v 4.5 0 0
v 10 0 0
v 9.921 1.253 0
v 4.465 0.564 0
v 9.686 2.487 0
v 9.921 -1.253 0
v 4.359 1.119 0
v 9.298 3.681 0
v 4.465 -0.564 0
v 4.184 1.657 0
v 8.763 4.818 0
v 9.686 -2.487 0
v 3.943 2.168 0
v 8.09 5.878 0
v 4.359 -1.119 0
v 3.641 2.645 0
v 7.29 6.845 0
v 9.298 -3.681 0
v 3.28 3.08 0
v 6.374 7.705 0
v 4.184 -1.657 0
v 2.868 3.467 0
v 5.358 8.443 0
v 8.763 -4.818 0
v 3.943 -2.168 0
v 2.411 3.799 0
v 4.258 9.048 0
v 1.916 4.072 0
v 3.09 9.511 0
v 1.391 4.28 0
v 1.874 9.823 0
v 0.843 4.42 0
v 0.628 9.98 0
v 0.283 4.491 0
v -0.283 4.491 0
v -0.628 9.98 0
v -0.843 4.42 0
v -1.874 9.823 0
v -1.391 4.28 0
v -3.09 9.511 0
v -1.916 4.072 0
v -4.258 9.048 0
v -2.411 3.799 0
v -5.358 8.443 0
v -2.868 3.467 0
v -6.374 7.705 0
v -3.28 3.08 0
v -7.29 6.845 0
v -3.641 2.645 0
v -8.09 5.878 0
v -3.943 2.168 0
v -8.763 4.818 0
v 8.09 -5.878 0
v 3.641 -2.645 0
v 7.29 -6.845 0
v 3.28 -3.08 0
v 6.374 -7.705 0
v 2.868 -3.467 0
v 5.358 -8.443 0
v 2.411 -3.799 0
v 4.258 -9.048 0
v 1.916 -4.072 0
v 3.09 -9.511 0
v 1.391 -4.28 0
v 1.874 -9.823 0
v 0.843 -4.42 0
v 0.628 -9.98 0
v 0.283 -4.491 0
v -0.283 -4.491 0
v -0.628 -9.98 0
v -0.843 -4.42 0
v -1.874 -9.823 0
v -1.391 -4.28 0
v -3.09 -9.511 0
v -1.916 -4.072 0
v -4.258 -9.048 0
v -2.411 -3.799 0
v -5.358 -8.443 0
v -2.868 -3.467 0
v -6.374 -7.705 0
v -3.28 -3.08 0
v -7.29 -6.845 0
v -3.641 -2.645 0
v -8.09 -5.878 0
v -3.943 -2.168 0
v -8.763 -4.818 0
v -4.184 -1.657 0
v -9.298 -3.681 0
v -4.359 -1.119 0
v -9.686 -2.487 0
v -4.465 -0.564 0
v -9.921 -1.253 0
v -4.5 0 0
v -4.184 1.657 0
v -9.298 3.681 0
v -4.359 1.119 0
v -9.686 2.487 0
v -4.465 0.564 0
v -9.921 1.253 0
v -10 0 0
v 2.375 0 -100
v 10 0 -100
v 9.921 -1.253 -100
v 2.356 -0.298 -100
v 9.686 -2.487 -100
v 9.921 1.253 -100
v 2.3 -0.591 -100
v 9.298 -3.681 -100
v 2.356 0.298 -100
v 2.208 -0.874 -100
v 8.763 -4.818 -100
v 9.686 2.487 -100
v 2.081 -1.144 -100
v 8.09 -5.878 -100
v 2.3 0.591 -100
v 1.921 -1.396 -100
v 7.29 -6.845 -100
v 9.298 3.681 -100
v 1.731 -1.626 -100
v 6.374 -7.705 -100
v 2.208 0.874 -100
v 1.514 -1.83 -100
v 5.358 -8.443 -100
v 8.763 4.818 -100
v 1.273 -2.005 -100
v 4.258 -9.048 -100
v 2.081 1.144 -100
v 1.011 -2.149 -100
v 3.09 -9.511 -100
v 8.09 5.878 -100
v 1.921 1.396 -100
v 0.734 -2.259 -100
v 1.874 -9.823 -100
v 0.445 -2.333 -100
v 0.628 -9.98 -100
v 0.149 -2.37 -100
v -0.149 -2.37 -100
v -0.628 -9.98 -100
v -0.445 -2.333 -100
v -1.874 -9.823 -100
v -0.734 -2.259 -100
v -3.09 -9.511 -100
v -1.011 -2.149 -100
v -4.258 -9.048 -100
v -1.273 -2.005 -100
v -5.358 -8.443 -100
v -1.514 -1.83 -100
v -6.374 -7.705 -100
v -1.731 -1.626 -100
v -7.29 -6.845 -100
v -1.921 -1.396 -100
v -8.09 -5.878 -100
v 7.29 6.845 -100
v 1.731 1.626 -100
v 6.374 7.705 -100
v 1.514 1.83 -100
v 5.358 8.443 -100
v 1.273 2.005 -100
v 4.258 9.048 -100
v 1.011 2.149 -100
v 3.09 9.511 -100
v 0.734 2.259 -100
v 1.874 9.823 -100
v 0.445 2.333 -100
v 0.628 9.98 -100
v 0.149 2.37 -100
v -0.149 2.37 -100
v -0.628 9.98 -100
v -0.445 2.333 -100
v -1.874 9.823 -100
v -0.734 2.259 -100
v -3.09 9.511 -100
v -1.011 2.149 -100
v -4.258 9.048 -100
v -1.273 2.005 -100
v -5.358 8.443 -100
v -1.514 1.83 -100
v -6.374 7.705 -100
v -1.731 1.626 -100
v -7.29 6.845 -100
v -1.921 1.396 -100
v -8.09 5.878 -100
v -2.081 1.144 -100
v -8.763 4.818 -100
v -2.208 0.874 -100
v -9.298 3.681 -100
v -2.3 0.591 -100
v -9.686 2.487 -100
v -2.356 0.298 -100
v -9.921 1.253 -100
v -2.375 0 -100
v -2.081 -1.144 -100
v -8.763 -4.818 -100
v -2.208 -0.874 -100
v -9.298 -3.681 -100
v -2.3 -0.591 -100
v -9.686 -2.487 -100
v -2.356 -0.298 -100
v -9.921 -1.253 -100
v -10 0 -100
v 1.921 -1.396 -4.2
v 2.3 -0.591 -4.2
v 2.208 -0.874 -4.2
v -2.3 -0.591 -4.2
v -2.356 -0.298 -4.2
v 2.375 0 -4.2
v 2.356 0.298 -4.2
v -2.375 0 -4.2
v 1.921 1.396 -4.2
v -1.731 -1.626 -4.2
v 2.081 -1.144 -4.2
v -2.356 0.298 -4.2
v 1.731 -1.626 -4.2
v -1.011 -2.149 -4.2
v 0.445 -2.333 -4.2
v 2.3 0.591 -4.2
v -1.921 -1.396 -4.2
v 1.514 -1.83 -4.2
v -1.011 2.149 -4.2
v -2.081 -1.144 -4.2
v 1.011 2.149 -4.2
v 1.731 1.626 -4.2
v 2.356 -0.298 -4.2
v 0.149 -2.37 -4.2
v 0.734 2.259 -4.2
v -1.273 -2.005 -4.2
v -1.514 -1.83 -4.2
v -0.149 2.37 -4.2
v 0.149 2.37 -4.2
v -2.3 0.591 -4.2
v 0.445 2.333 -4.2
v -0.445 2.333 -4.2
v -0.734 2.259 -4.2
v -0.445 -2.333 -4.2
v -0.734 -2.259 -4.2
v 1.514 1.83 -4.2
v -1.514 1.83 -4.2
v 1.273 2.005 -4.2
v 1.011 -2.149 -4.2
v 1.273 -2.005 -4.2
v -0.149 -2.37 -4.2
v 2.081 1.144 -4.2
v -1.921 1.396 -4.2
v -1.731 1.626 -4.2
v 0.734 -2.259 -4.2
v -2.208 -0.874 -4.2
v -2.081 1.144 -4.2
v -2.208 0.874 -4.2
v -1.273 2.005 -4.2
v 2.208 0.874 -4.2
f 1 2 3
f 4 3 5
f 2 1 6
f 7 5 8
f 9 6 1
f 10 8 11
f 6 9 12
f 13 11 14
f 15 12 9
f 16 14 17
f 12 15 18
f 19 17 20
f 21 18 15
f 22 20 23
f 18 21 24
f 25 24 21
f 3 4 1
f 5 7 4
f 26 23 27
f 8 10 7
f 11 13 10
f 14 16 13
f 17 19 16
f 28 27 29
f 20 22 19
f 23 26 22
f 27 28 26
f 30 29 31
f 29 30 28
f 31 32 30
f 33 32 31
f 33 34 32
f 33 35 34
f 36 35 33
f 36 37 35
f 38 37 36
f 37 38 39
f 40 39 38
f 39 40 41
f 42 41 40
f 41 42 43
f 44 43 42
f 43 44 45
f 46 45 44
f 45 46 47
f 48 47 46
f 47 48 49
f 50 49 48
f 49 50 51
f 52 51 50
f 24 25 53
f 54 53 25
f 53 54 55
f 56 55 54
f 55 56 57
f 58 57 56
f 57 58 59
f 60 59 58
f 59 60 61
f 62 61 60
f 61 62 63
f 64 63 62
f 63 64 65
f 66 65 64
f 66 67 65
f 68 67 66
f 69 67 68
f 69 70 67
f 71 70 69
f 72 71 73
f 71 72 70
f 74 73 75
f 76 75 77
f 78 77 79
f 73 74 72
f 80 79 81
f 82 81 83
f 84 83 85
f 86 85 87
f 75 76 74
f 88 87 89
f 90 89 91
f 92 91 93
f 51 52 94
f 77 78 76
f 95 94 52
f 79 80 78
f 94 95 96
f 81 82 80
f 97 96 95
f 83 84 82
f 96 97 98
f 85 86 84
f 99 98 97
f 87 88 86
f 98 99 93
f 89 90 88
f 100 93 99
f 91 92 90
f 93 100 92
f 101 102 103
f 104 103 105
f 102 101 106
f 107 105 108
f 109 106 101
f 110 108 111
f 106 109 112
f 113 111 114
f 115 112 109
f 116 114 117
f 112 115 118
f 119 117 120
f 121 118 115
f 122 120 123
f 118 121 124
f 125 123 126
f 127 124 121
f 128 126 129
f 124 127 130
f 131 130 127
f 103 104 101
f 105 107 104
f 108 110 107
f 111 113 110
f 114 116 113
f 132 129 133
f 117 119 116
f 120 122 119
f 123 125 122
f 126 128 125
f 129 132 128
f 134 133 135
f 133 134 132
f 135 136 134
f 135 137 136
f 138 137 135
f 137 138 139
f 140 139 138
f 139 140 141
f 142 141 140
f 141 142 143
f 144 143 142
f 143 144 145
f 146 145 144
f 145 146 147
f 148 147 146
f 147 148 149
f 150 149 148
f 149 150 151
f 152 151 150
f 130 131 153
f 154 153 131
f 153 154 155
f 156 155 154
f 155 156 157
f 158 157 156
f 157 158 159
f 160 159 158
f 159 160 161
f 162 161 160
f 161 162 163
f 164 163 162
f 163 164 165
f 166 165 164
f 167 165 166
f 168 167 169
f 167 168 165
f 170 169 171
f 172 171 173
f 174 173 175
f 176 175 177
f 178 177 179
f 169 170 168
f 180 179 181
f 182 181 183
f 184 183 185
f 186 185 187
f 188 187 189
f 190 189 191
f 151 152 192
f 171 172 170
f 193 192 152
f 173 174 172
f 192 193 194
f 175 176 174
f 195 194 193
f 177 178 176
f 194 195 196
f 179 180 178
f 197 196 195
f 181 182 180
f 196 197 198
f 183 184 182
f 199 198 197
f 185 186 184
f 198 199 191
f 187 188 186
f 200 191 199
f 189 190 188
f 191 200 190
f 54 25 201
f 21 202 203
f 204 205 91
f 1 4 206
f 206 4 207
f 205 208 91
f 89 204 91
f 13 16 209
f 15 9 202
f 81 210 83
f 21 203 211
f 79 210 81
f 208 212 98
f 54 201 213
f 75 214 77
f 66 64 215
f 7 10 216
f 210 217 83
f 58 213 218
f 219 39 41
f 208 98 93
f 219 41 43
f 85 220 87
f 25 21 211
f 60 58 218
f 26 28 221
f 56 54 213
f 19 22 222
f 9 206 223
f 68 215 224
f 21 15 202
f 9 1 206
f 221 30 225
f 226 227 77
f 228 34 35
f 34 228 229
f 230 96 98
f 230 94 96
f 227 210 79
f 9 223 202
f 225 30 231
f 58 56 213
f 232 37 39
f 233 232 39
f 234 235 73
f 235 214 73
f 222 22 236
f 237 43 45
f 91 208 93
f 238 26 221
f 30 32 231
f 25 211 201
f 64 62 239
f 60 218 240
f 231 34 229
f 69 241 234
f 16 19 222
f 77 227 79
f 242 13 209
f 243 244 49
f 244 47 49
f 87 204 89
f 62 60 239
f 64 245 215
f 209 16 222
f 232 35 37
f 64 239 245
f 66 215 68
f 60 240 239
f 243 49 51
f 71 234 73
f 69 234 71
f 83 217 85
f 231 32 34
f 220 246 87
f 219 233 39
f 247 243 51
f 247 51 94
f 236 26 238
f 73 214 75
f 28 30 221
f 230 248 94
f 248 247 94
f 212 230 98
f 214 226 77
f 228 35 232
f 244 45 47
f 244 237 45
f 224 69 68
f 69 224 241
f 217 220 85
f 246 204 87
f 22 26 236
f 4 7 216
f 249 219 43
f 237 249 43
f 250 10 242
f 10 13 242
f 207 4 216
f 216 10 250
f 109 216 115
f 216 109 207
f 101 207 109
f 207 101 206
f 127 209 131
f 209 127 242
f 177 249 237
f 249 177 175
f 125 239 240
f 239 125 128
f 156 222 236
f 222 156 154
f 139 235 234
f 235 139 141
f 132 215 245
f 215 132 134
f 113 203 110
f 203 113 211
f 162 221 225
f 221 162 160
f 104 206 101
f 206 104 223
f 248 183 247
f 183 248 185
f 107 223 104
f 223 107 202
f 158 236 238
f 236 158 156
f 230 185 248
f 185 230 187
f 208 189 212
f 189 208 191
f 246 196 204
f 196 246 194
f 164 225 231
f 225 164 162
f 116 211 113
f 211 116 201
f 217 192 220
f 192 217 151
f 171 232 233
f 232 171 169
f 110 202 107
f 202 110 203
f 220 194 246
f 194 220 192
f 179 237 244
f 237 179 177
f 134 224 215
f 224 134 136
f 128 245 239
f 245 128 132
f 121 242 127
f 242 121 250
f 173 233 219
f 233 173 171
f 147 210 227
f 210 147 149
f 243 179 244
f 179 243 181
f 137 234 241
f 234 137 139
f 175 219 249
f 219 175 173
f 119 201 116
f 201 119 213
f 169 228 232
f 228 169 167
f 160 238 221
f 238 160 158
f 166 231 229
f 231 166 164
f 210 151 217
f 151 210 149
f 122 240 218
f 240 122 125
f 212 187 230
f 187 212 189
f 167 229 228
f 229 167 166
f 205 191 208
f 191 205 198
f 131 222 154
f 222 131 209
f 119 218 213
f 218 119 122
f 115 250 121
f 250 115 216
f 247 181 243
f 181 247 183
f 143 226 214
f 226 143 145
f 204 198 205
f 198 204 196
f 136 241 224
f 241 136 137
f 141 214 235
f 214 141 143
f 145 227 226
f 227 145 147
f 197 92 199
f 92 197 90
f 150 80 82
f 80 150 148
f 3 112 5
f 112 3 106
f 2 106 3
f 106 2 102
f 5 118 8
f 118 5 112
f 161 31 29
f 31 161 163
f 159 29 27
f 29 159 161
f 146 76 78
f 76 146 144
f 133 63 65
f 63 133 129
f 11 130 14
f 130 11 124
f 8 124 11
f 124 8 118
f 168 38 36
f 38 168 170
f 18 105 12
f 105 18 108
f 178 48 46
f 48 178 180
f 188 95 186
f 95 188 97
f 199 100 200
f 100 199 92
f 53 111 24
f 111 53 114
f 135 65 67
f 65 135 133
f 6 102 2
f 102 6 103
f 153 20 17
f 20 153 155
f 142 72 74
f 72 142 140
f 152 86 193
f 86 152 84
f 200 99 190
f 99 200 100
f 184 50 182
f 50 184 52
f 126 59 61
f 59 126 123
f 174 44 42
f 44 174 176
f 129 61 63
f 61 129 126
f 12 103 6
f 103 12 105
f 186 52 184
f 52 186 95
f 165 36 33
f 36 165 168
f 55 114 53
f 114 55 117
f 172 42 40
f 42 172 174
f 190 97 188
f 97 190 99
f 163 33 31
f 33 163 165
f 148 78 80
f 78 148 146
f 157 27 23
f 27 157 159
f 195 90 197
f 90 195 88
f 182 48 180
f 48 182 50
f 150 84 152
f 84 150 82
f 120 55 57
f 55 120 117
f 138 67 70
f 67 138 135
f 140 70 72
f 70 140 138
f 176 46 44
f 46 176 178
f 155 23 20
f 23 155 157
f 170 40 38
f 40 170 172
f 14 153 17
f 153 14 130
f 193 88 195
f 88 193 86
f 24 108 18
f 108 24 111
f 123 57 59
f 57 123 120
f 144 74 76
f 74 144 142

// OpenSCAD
$fn = 50;


difference() {
	union() {
		translate(v = [0, 0, -100.0000000000]) {
			cylinder(h = 100, r = 10.0000000000);
		}
		cylinder(h = 0, r = 16.0000000000);
	}
	union() {
		translate(v = [0, 0, 0]) {
			rotate(a = [0, 0, 0]) {
				difference() {
					union() {
						#translate(v = [0, 0, -100.0000000000]) {
							cylinder(h = 100, r = 2.2500000000);
						}
						#translate(v = [0, 0, -4.2000000000]) {
							cylinder(h = 4.2000000000, r1 = 2.3750000000, r2 = 4.5000000000);
						}
						#translate(v = [0, 0, -100.0000000000]) {
							cylinder(h = 100, r = 2.3750000000);
						}
						#translate(v = [0, 0, -100.0000000000]) {
							cylinder(h = 100, r = 2.2500000000);
						}
					}
					union();
				}
			}
		}
	}
}
